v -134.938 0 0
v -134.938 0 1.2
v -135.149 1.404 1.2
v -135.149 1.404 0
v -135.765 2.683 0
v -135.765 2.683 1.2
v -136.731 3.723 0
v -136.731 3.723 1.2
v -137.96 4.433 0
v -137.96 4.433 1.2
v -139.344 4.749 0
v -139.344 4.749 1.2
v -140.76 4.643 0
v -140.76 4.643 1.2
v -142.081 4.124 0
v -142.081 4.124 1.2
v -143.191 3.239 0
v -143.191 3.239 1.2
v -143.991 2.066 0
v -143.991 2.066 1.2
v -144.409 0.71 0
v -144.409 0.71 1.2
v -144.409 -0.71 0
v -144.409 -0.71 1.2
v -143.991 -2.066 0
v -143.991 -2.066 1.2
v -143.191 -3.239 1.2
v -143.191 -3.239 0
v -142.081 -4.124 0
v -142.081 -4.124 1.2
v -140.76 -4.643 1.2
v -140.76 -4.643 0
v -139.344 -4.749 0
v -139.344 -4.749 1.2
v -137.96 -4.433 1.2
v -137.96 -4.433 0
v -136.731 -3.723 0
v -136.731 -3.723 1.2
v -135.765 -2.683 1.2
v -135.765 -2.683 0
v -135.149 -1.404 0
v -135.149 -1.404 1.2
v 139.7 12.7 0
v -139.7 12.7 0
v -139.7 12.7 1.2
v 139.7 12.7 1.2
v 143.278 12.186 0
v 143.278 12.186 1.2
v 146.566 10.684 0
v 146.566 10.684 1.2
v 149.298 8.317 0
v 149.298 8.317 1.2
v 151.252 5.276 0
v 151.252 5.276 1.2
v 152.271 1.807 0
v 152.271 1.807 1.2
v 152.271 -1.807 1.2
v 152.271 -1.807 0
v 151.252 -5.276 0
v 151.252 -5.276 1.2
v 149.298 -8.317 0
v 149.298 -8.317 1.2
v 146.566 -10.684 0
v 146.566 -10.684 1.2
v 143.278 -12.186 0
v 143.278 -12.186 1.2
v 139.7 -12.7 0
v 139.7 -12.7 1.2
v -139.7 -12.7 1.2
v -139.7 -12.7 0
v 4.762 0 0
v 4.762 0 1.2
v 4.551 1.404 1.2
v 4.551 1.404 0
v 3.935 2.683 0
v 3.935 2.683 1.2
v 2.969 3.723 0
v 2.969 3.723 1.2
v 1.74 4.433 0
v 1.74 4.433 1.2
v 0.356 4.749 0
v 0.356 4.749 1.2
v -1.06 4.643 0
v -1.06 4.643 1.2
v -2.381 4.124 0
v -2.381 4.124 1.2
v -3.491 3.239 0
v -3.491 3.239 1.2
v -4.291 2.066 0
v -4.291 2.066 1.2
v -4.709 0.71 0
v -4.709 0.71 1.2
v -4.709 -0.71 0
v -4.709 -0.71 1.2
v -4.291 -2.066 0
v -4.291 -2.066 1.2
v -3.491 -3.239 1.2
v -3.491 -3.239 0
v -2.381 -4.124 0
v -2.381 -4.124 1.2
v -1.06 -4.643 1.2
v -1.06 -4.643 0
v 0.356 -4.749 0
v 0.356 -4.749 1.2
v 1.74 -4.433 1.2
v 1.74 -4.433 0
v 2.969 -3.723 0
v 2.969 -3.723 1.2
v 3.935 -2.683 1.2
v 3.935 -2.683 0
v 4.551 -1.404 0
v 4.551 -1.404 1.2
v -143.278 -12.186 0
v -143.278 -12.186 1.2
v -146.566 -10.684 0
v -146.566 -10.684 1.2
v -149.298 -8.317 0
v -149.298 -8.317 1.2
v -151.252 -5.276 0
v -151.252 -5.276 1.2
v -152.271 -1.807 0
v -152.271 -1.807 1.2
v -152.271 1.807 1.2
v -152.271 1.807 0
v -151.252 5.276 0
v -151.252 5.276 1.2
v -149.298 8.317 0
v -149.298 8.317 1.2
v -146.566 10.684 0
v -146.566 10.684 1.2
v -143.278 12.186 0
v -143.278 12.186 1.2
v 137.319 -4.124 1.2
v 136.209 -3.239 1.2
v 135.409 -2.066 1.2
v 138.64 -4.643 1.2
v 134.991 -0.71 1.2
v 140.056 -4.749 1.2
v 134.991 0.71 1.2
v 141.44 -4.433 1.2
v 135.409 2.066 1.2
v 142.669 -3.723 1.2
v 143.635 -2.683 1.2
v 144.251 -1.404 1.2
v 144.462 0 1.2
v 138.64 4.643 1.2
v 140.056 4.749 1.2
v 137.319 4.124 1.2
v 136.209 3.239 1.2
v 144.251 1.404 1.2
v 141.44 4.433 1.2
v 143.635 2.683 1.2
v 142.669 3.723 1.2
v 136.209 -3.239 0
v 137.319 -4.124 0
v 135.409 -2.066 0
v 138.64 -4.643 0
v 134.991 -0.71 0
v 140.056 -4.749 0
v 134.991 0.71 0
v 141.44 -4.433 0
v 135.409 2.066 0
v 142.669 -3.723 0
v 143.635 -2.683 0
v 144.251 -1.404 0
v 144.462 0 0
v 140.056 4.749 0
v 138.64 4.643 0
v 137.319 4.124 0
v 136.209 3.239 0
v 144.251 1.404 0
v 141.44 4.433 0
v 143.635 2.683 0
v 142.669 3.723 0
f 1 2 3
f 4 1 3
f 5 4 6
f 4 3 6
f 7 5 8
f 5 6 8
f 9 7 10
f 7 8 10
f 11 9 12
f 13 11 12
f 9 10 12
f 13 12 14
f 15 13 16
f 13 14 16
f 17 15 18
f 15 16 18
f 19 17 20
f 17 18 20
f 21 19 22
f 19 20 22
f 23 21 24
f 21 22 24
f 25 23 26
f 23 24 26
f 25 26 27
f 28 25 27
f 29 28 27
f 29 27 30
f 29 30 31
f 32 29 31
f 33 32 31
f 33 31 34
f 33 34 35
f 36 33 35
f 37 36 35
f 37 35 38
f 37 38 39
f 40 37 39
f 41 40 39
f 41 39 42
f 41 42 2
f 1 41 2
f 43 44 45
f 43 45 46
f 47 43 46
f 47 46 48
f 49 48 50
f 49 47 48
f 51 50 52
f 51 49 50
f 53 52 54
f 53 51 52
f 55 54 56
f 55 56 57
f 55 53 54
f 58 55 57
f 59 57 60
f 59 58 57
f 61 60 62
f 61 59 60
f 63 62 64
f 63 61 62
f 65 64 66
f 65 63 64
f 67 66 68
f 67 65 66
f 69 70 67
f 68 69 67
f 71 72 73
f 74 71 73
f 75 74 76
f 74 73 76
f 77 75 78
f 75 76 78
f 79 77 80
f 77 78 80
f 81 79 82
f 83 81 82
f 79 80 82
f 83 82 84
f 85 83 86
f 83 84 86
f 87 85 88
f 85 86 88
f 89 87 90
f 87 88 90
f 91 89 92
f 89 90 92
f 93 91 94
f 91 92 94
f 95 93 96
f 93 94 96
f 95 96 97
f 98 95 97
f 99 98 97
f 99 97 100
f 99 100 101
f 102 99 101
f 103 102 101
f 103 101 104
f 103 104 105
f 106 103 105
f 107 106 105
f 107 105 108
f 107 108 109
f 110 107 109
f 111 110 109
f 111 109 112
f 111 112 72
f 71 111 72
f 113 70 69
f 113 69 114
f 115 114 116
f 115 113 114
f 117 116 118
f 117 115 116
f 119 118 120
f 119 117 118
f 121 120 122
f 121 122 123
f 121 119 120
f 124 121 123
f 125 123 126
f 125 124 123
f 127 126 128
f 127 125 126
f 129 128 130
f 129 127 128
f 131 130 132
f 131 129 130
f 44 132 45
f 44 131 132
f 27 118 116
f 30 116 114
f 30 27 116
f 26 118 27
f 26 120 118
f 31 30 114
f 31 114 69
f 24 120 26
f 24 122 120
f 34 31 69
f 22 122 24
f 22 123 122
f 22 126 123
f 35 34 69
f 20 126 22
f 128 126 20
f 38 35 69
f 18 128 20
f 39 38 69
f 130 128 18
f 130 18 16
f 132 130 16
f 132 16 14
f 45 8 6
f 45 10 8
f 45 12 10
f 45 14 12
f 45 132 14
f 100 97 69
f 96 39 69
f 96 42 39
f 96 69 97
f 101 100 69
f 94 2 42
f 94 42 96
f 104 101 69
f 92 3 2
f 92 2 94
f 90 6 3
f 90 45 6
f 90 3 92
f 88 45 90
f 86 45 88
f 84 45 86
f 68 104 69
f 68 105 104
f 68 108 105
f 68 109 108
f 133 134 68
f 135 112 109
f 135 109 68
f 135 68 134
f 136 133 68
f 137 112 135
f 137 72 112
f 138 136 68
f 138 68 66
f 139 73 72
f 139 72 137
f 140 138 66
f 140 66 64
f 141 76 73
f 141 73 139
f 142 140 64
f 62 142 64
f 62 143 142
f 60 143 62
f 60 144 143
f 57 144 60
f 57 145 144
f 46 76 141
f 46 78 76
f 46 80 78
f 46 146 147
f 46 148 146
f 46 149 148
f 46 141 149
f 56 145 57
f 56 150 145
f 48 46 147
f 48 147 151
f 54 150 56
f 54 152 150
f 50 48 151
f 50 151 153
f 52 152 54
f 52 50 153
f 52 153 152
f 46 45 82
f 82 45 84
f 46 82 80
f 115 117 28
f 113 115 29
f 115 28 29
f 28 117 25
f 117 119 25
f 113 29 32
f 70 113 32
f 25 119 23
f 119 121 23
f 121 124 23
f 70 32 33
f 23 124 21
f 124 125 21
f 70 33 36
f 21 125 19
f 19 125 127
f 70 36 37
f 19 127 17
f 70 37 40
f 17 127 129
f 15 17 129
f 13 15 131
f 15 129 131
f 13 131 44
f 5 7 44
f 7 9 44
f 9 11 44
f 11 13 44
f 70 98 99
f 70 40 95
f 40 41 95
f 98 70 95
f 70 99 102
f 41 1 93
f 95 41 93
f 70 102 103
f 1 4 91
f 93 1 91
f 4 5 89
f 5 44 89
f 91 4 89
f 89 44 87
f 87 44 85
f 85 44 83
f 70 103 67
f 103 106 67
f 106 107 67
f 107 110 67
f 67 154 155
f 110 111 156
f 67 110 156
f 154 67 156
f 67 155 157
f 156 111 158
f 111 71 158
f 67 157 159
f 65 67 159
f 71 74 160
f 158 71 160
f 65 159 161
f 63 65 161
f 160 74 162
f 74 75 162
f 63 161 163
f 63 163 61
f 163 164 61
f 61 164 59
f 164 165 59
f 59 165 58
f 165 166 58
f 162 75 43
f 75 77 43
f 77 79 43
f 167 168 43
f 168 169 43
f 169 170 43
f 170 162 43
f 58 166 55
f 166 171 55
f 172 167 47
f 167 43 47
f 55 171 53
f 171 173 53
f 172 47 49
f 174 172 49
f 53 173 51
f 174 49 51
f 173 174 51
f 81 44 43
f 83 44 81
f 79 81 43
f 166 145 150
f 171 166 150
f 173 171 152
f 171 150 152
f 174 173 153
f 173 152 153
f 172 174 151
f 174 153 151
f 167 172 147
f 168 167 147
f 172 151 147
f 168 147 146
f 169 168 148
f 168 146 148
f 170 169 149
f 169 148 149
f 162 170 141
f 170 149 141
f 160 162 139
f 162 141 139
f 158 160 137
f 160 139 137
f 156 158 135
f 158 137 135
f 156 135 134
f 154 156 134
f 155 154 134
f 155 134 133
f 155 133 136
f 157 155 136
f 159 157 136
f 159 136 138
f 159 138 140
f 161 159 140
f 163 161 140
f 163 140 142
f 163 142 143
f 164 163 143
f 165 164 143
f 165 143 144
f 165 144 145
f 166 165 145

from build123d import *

# Parameters (mm, degrees)
SKETCH1_W           = 279.4
SKETCH1_H           = 25.4
BOSS_EXTRUDE1_DEPTH = 1.2
SKETCH2_R           = 4.7625
CUT_EXTRUDE1_DEPTH  = 2.2
SKETCH3_R           = 4.7625
CUT_EXTRUDE2_DEPTH  = 2.2


with BuildPart() as part:
    # Sketch1 → Boss-Extrude1 (new body)
    with BuildSketch(Plane.XY):
        Rectangle(SKETCH1_W, SKETCH1_H)
        with BuildLine():
            ThreePointArc((139.7, 12.7), (152.4, 0), (139.7, -12.7))
            Line((139.7, -12.7), (139.7, 12.7))
        make_face()
        with BuildLine():
            Line((-139.7, 12.7), (-139.7, -12.7))
            ThreePointArc((-139.7, -12.7), (-152.4, 0), (-139.7, 12.7))
        make_face()
    extrude(amount=BOSS_EXTRUDE1_DEPTH)

    # Sketch2 → Cut-Extrude1 (cut, through all)
    with BuildSketch(Plane.XY.offset(1.2)):
        Circle(SKETCH2_R)
    extrude(amount=-CUT_EXTRUDE1_DEPTH, mode=Mode.SUBTRACT)

    # Sketch3 → Cut-Extrude2 (cut, through all)
    with BuildSketch(Plane.XY.offset(1.2)):
        with Locations((-139.7, 0)):
            Circle(SKETCH3_R)
        with Locations((139.7, 0)):
            Circle(SKETCH3_R)
    extrude(amount=-CUT_EXTRUDE2_DEPTH, mode=Mode.SUBTRACT)


solid = part.part
